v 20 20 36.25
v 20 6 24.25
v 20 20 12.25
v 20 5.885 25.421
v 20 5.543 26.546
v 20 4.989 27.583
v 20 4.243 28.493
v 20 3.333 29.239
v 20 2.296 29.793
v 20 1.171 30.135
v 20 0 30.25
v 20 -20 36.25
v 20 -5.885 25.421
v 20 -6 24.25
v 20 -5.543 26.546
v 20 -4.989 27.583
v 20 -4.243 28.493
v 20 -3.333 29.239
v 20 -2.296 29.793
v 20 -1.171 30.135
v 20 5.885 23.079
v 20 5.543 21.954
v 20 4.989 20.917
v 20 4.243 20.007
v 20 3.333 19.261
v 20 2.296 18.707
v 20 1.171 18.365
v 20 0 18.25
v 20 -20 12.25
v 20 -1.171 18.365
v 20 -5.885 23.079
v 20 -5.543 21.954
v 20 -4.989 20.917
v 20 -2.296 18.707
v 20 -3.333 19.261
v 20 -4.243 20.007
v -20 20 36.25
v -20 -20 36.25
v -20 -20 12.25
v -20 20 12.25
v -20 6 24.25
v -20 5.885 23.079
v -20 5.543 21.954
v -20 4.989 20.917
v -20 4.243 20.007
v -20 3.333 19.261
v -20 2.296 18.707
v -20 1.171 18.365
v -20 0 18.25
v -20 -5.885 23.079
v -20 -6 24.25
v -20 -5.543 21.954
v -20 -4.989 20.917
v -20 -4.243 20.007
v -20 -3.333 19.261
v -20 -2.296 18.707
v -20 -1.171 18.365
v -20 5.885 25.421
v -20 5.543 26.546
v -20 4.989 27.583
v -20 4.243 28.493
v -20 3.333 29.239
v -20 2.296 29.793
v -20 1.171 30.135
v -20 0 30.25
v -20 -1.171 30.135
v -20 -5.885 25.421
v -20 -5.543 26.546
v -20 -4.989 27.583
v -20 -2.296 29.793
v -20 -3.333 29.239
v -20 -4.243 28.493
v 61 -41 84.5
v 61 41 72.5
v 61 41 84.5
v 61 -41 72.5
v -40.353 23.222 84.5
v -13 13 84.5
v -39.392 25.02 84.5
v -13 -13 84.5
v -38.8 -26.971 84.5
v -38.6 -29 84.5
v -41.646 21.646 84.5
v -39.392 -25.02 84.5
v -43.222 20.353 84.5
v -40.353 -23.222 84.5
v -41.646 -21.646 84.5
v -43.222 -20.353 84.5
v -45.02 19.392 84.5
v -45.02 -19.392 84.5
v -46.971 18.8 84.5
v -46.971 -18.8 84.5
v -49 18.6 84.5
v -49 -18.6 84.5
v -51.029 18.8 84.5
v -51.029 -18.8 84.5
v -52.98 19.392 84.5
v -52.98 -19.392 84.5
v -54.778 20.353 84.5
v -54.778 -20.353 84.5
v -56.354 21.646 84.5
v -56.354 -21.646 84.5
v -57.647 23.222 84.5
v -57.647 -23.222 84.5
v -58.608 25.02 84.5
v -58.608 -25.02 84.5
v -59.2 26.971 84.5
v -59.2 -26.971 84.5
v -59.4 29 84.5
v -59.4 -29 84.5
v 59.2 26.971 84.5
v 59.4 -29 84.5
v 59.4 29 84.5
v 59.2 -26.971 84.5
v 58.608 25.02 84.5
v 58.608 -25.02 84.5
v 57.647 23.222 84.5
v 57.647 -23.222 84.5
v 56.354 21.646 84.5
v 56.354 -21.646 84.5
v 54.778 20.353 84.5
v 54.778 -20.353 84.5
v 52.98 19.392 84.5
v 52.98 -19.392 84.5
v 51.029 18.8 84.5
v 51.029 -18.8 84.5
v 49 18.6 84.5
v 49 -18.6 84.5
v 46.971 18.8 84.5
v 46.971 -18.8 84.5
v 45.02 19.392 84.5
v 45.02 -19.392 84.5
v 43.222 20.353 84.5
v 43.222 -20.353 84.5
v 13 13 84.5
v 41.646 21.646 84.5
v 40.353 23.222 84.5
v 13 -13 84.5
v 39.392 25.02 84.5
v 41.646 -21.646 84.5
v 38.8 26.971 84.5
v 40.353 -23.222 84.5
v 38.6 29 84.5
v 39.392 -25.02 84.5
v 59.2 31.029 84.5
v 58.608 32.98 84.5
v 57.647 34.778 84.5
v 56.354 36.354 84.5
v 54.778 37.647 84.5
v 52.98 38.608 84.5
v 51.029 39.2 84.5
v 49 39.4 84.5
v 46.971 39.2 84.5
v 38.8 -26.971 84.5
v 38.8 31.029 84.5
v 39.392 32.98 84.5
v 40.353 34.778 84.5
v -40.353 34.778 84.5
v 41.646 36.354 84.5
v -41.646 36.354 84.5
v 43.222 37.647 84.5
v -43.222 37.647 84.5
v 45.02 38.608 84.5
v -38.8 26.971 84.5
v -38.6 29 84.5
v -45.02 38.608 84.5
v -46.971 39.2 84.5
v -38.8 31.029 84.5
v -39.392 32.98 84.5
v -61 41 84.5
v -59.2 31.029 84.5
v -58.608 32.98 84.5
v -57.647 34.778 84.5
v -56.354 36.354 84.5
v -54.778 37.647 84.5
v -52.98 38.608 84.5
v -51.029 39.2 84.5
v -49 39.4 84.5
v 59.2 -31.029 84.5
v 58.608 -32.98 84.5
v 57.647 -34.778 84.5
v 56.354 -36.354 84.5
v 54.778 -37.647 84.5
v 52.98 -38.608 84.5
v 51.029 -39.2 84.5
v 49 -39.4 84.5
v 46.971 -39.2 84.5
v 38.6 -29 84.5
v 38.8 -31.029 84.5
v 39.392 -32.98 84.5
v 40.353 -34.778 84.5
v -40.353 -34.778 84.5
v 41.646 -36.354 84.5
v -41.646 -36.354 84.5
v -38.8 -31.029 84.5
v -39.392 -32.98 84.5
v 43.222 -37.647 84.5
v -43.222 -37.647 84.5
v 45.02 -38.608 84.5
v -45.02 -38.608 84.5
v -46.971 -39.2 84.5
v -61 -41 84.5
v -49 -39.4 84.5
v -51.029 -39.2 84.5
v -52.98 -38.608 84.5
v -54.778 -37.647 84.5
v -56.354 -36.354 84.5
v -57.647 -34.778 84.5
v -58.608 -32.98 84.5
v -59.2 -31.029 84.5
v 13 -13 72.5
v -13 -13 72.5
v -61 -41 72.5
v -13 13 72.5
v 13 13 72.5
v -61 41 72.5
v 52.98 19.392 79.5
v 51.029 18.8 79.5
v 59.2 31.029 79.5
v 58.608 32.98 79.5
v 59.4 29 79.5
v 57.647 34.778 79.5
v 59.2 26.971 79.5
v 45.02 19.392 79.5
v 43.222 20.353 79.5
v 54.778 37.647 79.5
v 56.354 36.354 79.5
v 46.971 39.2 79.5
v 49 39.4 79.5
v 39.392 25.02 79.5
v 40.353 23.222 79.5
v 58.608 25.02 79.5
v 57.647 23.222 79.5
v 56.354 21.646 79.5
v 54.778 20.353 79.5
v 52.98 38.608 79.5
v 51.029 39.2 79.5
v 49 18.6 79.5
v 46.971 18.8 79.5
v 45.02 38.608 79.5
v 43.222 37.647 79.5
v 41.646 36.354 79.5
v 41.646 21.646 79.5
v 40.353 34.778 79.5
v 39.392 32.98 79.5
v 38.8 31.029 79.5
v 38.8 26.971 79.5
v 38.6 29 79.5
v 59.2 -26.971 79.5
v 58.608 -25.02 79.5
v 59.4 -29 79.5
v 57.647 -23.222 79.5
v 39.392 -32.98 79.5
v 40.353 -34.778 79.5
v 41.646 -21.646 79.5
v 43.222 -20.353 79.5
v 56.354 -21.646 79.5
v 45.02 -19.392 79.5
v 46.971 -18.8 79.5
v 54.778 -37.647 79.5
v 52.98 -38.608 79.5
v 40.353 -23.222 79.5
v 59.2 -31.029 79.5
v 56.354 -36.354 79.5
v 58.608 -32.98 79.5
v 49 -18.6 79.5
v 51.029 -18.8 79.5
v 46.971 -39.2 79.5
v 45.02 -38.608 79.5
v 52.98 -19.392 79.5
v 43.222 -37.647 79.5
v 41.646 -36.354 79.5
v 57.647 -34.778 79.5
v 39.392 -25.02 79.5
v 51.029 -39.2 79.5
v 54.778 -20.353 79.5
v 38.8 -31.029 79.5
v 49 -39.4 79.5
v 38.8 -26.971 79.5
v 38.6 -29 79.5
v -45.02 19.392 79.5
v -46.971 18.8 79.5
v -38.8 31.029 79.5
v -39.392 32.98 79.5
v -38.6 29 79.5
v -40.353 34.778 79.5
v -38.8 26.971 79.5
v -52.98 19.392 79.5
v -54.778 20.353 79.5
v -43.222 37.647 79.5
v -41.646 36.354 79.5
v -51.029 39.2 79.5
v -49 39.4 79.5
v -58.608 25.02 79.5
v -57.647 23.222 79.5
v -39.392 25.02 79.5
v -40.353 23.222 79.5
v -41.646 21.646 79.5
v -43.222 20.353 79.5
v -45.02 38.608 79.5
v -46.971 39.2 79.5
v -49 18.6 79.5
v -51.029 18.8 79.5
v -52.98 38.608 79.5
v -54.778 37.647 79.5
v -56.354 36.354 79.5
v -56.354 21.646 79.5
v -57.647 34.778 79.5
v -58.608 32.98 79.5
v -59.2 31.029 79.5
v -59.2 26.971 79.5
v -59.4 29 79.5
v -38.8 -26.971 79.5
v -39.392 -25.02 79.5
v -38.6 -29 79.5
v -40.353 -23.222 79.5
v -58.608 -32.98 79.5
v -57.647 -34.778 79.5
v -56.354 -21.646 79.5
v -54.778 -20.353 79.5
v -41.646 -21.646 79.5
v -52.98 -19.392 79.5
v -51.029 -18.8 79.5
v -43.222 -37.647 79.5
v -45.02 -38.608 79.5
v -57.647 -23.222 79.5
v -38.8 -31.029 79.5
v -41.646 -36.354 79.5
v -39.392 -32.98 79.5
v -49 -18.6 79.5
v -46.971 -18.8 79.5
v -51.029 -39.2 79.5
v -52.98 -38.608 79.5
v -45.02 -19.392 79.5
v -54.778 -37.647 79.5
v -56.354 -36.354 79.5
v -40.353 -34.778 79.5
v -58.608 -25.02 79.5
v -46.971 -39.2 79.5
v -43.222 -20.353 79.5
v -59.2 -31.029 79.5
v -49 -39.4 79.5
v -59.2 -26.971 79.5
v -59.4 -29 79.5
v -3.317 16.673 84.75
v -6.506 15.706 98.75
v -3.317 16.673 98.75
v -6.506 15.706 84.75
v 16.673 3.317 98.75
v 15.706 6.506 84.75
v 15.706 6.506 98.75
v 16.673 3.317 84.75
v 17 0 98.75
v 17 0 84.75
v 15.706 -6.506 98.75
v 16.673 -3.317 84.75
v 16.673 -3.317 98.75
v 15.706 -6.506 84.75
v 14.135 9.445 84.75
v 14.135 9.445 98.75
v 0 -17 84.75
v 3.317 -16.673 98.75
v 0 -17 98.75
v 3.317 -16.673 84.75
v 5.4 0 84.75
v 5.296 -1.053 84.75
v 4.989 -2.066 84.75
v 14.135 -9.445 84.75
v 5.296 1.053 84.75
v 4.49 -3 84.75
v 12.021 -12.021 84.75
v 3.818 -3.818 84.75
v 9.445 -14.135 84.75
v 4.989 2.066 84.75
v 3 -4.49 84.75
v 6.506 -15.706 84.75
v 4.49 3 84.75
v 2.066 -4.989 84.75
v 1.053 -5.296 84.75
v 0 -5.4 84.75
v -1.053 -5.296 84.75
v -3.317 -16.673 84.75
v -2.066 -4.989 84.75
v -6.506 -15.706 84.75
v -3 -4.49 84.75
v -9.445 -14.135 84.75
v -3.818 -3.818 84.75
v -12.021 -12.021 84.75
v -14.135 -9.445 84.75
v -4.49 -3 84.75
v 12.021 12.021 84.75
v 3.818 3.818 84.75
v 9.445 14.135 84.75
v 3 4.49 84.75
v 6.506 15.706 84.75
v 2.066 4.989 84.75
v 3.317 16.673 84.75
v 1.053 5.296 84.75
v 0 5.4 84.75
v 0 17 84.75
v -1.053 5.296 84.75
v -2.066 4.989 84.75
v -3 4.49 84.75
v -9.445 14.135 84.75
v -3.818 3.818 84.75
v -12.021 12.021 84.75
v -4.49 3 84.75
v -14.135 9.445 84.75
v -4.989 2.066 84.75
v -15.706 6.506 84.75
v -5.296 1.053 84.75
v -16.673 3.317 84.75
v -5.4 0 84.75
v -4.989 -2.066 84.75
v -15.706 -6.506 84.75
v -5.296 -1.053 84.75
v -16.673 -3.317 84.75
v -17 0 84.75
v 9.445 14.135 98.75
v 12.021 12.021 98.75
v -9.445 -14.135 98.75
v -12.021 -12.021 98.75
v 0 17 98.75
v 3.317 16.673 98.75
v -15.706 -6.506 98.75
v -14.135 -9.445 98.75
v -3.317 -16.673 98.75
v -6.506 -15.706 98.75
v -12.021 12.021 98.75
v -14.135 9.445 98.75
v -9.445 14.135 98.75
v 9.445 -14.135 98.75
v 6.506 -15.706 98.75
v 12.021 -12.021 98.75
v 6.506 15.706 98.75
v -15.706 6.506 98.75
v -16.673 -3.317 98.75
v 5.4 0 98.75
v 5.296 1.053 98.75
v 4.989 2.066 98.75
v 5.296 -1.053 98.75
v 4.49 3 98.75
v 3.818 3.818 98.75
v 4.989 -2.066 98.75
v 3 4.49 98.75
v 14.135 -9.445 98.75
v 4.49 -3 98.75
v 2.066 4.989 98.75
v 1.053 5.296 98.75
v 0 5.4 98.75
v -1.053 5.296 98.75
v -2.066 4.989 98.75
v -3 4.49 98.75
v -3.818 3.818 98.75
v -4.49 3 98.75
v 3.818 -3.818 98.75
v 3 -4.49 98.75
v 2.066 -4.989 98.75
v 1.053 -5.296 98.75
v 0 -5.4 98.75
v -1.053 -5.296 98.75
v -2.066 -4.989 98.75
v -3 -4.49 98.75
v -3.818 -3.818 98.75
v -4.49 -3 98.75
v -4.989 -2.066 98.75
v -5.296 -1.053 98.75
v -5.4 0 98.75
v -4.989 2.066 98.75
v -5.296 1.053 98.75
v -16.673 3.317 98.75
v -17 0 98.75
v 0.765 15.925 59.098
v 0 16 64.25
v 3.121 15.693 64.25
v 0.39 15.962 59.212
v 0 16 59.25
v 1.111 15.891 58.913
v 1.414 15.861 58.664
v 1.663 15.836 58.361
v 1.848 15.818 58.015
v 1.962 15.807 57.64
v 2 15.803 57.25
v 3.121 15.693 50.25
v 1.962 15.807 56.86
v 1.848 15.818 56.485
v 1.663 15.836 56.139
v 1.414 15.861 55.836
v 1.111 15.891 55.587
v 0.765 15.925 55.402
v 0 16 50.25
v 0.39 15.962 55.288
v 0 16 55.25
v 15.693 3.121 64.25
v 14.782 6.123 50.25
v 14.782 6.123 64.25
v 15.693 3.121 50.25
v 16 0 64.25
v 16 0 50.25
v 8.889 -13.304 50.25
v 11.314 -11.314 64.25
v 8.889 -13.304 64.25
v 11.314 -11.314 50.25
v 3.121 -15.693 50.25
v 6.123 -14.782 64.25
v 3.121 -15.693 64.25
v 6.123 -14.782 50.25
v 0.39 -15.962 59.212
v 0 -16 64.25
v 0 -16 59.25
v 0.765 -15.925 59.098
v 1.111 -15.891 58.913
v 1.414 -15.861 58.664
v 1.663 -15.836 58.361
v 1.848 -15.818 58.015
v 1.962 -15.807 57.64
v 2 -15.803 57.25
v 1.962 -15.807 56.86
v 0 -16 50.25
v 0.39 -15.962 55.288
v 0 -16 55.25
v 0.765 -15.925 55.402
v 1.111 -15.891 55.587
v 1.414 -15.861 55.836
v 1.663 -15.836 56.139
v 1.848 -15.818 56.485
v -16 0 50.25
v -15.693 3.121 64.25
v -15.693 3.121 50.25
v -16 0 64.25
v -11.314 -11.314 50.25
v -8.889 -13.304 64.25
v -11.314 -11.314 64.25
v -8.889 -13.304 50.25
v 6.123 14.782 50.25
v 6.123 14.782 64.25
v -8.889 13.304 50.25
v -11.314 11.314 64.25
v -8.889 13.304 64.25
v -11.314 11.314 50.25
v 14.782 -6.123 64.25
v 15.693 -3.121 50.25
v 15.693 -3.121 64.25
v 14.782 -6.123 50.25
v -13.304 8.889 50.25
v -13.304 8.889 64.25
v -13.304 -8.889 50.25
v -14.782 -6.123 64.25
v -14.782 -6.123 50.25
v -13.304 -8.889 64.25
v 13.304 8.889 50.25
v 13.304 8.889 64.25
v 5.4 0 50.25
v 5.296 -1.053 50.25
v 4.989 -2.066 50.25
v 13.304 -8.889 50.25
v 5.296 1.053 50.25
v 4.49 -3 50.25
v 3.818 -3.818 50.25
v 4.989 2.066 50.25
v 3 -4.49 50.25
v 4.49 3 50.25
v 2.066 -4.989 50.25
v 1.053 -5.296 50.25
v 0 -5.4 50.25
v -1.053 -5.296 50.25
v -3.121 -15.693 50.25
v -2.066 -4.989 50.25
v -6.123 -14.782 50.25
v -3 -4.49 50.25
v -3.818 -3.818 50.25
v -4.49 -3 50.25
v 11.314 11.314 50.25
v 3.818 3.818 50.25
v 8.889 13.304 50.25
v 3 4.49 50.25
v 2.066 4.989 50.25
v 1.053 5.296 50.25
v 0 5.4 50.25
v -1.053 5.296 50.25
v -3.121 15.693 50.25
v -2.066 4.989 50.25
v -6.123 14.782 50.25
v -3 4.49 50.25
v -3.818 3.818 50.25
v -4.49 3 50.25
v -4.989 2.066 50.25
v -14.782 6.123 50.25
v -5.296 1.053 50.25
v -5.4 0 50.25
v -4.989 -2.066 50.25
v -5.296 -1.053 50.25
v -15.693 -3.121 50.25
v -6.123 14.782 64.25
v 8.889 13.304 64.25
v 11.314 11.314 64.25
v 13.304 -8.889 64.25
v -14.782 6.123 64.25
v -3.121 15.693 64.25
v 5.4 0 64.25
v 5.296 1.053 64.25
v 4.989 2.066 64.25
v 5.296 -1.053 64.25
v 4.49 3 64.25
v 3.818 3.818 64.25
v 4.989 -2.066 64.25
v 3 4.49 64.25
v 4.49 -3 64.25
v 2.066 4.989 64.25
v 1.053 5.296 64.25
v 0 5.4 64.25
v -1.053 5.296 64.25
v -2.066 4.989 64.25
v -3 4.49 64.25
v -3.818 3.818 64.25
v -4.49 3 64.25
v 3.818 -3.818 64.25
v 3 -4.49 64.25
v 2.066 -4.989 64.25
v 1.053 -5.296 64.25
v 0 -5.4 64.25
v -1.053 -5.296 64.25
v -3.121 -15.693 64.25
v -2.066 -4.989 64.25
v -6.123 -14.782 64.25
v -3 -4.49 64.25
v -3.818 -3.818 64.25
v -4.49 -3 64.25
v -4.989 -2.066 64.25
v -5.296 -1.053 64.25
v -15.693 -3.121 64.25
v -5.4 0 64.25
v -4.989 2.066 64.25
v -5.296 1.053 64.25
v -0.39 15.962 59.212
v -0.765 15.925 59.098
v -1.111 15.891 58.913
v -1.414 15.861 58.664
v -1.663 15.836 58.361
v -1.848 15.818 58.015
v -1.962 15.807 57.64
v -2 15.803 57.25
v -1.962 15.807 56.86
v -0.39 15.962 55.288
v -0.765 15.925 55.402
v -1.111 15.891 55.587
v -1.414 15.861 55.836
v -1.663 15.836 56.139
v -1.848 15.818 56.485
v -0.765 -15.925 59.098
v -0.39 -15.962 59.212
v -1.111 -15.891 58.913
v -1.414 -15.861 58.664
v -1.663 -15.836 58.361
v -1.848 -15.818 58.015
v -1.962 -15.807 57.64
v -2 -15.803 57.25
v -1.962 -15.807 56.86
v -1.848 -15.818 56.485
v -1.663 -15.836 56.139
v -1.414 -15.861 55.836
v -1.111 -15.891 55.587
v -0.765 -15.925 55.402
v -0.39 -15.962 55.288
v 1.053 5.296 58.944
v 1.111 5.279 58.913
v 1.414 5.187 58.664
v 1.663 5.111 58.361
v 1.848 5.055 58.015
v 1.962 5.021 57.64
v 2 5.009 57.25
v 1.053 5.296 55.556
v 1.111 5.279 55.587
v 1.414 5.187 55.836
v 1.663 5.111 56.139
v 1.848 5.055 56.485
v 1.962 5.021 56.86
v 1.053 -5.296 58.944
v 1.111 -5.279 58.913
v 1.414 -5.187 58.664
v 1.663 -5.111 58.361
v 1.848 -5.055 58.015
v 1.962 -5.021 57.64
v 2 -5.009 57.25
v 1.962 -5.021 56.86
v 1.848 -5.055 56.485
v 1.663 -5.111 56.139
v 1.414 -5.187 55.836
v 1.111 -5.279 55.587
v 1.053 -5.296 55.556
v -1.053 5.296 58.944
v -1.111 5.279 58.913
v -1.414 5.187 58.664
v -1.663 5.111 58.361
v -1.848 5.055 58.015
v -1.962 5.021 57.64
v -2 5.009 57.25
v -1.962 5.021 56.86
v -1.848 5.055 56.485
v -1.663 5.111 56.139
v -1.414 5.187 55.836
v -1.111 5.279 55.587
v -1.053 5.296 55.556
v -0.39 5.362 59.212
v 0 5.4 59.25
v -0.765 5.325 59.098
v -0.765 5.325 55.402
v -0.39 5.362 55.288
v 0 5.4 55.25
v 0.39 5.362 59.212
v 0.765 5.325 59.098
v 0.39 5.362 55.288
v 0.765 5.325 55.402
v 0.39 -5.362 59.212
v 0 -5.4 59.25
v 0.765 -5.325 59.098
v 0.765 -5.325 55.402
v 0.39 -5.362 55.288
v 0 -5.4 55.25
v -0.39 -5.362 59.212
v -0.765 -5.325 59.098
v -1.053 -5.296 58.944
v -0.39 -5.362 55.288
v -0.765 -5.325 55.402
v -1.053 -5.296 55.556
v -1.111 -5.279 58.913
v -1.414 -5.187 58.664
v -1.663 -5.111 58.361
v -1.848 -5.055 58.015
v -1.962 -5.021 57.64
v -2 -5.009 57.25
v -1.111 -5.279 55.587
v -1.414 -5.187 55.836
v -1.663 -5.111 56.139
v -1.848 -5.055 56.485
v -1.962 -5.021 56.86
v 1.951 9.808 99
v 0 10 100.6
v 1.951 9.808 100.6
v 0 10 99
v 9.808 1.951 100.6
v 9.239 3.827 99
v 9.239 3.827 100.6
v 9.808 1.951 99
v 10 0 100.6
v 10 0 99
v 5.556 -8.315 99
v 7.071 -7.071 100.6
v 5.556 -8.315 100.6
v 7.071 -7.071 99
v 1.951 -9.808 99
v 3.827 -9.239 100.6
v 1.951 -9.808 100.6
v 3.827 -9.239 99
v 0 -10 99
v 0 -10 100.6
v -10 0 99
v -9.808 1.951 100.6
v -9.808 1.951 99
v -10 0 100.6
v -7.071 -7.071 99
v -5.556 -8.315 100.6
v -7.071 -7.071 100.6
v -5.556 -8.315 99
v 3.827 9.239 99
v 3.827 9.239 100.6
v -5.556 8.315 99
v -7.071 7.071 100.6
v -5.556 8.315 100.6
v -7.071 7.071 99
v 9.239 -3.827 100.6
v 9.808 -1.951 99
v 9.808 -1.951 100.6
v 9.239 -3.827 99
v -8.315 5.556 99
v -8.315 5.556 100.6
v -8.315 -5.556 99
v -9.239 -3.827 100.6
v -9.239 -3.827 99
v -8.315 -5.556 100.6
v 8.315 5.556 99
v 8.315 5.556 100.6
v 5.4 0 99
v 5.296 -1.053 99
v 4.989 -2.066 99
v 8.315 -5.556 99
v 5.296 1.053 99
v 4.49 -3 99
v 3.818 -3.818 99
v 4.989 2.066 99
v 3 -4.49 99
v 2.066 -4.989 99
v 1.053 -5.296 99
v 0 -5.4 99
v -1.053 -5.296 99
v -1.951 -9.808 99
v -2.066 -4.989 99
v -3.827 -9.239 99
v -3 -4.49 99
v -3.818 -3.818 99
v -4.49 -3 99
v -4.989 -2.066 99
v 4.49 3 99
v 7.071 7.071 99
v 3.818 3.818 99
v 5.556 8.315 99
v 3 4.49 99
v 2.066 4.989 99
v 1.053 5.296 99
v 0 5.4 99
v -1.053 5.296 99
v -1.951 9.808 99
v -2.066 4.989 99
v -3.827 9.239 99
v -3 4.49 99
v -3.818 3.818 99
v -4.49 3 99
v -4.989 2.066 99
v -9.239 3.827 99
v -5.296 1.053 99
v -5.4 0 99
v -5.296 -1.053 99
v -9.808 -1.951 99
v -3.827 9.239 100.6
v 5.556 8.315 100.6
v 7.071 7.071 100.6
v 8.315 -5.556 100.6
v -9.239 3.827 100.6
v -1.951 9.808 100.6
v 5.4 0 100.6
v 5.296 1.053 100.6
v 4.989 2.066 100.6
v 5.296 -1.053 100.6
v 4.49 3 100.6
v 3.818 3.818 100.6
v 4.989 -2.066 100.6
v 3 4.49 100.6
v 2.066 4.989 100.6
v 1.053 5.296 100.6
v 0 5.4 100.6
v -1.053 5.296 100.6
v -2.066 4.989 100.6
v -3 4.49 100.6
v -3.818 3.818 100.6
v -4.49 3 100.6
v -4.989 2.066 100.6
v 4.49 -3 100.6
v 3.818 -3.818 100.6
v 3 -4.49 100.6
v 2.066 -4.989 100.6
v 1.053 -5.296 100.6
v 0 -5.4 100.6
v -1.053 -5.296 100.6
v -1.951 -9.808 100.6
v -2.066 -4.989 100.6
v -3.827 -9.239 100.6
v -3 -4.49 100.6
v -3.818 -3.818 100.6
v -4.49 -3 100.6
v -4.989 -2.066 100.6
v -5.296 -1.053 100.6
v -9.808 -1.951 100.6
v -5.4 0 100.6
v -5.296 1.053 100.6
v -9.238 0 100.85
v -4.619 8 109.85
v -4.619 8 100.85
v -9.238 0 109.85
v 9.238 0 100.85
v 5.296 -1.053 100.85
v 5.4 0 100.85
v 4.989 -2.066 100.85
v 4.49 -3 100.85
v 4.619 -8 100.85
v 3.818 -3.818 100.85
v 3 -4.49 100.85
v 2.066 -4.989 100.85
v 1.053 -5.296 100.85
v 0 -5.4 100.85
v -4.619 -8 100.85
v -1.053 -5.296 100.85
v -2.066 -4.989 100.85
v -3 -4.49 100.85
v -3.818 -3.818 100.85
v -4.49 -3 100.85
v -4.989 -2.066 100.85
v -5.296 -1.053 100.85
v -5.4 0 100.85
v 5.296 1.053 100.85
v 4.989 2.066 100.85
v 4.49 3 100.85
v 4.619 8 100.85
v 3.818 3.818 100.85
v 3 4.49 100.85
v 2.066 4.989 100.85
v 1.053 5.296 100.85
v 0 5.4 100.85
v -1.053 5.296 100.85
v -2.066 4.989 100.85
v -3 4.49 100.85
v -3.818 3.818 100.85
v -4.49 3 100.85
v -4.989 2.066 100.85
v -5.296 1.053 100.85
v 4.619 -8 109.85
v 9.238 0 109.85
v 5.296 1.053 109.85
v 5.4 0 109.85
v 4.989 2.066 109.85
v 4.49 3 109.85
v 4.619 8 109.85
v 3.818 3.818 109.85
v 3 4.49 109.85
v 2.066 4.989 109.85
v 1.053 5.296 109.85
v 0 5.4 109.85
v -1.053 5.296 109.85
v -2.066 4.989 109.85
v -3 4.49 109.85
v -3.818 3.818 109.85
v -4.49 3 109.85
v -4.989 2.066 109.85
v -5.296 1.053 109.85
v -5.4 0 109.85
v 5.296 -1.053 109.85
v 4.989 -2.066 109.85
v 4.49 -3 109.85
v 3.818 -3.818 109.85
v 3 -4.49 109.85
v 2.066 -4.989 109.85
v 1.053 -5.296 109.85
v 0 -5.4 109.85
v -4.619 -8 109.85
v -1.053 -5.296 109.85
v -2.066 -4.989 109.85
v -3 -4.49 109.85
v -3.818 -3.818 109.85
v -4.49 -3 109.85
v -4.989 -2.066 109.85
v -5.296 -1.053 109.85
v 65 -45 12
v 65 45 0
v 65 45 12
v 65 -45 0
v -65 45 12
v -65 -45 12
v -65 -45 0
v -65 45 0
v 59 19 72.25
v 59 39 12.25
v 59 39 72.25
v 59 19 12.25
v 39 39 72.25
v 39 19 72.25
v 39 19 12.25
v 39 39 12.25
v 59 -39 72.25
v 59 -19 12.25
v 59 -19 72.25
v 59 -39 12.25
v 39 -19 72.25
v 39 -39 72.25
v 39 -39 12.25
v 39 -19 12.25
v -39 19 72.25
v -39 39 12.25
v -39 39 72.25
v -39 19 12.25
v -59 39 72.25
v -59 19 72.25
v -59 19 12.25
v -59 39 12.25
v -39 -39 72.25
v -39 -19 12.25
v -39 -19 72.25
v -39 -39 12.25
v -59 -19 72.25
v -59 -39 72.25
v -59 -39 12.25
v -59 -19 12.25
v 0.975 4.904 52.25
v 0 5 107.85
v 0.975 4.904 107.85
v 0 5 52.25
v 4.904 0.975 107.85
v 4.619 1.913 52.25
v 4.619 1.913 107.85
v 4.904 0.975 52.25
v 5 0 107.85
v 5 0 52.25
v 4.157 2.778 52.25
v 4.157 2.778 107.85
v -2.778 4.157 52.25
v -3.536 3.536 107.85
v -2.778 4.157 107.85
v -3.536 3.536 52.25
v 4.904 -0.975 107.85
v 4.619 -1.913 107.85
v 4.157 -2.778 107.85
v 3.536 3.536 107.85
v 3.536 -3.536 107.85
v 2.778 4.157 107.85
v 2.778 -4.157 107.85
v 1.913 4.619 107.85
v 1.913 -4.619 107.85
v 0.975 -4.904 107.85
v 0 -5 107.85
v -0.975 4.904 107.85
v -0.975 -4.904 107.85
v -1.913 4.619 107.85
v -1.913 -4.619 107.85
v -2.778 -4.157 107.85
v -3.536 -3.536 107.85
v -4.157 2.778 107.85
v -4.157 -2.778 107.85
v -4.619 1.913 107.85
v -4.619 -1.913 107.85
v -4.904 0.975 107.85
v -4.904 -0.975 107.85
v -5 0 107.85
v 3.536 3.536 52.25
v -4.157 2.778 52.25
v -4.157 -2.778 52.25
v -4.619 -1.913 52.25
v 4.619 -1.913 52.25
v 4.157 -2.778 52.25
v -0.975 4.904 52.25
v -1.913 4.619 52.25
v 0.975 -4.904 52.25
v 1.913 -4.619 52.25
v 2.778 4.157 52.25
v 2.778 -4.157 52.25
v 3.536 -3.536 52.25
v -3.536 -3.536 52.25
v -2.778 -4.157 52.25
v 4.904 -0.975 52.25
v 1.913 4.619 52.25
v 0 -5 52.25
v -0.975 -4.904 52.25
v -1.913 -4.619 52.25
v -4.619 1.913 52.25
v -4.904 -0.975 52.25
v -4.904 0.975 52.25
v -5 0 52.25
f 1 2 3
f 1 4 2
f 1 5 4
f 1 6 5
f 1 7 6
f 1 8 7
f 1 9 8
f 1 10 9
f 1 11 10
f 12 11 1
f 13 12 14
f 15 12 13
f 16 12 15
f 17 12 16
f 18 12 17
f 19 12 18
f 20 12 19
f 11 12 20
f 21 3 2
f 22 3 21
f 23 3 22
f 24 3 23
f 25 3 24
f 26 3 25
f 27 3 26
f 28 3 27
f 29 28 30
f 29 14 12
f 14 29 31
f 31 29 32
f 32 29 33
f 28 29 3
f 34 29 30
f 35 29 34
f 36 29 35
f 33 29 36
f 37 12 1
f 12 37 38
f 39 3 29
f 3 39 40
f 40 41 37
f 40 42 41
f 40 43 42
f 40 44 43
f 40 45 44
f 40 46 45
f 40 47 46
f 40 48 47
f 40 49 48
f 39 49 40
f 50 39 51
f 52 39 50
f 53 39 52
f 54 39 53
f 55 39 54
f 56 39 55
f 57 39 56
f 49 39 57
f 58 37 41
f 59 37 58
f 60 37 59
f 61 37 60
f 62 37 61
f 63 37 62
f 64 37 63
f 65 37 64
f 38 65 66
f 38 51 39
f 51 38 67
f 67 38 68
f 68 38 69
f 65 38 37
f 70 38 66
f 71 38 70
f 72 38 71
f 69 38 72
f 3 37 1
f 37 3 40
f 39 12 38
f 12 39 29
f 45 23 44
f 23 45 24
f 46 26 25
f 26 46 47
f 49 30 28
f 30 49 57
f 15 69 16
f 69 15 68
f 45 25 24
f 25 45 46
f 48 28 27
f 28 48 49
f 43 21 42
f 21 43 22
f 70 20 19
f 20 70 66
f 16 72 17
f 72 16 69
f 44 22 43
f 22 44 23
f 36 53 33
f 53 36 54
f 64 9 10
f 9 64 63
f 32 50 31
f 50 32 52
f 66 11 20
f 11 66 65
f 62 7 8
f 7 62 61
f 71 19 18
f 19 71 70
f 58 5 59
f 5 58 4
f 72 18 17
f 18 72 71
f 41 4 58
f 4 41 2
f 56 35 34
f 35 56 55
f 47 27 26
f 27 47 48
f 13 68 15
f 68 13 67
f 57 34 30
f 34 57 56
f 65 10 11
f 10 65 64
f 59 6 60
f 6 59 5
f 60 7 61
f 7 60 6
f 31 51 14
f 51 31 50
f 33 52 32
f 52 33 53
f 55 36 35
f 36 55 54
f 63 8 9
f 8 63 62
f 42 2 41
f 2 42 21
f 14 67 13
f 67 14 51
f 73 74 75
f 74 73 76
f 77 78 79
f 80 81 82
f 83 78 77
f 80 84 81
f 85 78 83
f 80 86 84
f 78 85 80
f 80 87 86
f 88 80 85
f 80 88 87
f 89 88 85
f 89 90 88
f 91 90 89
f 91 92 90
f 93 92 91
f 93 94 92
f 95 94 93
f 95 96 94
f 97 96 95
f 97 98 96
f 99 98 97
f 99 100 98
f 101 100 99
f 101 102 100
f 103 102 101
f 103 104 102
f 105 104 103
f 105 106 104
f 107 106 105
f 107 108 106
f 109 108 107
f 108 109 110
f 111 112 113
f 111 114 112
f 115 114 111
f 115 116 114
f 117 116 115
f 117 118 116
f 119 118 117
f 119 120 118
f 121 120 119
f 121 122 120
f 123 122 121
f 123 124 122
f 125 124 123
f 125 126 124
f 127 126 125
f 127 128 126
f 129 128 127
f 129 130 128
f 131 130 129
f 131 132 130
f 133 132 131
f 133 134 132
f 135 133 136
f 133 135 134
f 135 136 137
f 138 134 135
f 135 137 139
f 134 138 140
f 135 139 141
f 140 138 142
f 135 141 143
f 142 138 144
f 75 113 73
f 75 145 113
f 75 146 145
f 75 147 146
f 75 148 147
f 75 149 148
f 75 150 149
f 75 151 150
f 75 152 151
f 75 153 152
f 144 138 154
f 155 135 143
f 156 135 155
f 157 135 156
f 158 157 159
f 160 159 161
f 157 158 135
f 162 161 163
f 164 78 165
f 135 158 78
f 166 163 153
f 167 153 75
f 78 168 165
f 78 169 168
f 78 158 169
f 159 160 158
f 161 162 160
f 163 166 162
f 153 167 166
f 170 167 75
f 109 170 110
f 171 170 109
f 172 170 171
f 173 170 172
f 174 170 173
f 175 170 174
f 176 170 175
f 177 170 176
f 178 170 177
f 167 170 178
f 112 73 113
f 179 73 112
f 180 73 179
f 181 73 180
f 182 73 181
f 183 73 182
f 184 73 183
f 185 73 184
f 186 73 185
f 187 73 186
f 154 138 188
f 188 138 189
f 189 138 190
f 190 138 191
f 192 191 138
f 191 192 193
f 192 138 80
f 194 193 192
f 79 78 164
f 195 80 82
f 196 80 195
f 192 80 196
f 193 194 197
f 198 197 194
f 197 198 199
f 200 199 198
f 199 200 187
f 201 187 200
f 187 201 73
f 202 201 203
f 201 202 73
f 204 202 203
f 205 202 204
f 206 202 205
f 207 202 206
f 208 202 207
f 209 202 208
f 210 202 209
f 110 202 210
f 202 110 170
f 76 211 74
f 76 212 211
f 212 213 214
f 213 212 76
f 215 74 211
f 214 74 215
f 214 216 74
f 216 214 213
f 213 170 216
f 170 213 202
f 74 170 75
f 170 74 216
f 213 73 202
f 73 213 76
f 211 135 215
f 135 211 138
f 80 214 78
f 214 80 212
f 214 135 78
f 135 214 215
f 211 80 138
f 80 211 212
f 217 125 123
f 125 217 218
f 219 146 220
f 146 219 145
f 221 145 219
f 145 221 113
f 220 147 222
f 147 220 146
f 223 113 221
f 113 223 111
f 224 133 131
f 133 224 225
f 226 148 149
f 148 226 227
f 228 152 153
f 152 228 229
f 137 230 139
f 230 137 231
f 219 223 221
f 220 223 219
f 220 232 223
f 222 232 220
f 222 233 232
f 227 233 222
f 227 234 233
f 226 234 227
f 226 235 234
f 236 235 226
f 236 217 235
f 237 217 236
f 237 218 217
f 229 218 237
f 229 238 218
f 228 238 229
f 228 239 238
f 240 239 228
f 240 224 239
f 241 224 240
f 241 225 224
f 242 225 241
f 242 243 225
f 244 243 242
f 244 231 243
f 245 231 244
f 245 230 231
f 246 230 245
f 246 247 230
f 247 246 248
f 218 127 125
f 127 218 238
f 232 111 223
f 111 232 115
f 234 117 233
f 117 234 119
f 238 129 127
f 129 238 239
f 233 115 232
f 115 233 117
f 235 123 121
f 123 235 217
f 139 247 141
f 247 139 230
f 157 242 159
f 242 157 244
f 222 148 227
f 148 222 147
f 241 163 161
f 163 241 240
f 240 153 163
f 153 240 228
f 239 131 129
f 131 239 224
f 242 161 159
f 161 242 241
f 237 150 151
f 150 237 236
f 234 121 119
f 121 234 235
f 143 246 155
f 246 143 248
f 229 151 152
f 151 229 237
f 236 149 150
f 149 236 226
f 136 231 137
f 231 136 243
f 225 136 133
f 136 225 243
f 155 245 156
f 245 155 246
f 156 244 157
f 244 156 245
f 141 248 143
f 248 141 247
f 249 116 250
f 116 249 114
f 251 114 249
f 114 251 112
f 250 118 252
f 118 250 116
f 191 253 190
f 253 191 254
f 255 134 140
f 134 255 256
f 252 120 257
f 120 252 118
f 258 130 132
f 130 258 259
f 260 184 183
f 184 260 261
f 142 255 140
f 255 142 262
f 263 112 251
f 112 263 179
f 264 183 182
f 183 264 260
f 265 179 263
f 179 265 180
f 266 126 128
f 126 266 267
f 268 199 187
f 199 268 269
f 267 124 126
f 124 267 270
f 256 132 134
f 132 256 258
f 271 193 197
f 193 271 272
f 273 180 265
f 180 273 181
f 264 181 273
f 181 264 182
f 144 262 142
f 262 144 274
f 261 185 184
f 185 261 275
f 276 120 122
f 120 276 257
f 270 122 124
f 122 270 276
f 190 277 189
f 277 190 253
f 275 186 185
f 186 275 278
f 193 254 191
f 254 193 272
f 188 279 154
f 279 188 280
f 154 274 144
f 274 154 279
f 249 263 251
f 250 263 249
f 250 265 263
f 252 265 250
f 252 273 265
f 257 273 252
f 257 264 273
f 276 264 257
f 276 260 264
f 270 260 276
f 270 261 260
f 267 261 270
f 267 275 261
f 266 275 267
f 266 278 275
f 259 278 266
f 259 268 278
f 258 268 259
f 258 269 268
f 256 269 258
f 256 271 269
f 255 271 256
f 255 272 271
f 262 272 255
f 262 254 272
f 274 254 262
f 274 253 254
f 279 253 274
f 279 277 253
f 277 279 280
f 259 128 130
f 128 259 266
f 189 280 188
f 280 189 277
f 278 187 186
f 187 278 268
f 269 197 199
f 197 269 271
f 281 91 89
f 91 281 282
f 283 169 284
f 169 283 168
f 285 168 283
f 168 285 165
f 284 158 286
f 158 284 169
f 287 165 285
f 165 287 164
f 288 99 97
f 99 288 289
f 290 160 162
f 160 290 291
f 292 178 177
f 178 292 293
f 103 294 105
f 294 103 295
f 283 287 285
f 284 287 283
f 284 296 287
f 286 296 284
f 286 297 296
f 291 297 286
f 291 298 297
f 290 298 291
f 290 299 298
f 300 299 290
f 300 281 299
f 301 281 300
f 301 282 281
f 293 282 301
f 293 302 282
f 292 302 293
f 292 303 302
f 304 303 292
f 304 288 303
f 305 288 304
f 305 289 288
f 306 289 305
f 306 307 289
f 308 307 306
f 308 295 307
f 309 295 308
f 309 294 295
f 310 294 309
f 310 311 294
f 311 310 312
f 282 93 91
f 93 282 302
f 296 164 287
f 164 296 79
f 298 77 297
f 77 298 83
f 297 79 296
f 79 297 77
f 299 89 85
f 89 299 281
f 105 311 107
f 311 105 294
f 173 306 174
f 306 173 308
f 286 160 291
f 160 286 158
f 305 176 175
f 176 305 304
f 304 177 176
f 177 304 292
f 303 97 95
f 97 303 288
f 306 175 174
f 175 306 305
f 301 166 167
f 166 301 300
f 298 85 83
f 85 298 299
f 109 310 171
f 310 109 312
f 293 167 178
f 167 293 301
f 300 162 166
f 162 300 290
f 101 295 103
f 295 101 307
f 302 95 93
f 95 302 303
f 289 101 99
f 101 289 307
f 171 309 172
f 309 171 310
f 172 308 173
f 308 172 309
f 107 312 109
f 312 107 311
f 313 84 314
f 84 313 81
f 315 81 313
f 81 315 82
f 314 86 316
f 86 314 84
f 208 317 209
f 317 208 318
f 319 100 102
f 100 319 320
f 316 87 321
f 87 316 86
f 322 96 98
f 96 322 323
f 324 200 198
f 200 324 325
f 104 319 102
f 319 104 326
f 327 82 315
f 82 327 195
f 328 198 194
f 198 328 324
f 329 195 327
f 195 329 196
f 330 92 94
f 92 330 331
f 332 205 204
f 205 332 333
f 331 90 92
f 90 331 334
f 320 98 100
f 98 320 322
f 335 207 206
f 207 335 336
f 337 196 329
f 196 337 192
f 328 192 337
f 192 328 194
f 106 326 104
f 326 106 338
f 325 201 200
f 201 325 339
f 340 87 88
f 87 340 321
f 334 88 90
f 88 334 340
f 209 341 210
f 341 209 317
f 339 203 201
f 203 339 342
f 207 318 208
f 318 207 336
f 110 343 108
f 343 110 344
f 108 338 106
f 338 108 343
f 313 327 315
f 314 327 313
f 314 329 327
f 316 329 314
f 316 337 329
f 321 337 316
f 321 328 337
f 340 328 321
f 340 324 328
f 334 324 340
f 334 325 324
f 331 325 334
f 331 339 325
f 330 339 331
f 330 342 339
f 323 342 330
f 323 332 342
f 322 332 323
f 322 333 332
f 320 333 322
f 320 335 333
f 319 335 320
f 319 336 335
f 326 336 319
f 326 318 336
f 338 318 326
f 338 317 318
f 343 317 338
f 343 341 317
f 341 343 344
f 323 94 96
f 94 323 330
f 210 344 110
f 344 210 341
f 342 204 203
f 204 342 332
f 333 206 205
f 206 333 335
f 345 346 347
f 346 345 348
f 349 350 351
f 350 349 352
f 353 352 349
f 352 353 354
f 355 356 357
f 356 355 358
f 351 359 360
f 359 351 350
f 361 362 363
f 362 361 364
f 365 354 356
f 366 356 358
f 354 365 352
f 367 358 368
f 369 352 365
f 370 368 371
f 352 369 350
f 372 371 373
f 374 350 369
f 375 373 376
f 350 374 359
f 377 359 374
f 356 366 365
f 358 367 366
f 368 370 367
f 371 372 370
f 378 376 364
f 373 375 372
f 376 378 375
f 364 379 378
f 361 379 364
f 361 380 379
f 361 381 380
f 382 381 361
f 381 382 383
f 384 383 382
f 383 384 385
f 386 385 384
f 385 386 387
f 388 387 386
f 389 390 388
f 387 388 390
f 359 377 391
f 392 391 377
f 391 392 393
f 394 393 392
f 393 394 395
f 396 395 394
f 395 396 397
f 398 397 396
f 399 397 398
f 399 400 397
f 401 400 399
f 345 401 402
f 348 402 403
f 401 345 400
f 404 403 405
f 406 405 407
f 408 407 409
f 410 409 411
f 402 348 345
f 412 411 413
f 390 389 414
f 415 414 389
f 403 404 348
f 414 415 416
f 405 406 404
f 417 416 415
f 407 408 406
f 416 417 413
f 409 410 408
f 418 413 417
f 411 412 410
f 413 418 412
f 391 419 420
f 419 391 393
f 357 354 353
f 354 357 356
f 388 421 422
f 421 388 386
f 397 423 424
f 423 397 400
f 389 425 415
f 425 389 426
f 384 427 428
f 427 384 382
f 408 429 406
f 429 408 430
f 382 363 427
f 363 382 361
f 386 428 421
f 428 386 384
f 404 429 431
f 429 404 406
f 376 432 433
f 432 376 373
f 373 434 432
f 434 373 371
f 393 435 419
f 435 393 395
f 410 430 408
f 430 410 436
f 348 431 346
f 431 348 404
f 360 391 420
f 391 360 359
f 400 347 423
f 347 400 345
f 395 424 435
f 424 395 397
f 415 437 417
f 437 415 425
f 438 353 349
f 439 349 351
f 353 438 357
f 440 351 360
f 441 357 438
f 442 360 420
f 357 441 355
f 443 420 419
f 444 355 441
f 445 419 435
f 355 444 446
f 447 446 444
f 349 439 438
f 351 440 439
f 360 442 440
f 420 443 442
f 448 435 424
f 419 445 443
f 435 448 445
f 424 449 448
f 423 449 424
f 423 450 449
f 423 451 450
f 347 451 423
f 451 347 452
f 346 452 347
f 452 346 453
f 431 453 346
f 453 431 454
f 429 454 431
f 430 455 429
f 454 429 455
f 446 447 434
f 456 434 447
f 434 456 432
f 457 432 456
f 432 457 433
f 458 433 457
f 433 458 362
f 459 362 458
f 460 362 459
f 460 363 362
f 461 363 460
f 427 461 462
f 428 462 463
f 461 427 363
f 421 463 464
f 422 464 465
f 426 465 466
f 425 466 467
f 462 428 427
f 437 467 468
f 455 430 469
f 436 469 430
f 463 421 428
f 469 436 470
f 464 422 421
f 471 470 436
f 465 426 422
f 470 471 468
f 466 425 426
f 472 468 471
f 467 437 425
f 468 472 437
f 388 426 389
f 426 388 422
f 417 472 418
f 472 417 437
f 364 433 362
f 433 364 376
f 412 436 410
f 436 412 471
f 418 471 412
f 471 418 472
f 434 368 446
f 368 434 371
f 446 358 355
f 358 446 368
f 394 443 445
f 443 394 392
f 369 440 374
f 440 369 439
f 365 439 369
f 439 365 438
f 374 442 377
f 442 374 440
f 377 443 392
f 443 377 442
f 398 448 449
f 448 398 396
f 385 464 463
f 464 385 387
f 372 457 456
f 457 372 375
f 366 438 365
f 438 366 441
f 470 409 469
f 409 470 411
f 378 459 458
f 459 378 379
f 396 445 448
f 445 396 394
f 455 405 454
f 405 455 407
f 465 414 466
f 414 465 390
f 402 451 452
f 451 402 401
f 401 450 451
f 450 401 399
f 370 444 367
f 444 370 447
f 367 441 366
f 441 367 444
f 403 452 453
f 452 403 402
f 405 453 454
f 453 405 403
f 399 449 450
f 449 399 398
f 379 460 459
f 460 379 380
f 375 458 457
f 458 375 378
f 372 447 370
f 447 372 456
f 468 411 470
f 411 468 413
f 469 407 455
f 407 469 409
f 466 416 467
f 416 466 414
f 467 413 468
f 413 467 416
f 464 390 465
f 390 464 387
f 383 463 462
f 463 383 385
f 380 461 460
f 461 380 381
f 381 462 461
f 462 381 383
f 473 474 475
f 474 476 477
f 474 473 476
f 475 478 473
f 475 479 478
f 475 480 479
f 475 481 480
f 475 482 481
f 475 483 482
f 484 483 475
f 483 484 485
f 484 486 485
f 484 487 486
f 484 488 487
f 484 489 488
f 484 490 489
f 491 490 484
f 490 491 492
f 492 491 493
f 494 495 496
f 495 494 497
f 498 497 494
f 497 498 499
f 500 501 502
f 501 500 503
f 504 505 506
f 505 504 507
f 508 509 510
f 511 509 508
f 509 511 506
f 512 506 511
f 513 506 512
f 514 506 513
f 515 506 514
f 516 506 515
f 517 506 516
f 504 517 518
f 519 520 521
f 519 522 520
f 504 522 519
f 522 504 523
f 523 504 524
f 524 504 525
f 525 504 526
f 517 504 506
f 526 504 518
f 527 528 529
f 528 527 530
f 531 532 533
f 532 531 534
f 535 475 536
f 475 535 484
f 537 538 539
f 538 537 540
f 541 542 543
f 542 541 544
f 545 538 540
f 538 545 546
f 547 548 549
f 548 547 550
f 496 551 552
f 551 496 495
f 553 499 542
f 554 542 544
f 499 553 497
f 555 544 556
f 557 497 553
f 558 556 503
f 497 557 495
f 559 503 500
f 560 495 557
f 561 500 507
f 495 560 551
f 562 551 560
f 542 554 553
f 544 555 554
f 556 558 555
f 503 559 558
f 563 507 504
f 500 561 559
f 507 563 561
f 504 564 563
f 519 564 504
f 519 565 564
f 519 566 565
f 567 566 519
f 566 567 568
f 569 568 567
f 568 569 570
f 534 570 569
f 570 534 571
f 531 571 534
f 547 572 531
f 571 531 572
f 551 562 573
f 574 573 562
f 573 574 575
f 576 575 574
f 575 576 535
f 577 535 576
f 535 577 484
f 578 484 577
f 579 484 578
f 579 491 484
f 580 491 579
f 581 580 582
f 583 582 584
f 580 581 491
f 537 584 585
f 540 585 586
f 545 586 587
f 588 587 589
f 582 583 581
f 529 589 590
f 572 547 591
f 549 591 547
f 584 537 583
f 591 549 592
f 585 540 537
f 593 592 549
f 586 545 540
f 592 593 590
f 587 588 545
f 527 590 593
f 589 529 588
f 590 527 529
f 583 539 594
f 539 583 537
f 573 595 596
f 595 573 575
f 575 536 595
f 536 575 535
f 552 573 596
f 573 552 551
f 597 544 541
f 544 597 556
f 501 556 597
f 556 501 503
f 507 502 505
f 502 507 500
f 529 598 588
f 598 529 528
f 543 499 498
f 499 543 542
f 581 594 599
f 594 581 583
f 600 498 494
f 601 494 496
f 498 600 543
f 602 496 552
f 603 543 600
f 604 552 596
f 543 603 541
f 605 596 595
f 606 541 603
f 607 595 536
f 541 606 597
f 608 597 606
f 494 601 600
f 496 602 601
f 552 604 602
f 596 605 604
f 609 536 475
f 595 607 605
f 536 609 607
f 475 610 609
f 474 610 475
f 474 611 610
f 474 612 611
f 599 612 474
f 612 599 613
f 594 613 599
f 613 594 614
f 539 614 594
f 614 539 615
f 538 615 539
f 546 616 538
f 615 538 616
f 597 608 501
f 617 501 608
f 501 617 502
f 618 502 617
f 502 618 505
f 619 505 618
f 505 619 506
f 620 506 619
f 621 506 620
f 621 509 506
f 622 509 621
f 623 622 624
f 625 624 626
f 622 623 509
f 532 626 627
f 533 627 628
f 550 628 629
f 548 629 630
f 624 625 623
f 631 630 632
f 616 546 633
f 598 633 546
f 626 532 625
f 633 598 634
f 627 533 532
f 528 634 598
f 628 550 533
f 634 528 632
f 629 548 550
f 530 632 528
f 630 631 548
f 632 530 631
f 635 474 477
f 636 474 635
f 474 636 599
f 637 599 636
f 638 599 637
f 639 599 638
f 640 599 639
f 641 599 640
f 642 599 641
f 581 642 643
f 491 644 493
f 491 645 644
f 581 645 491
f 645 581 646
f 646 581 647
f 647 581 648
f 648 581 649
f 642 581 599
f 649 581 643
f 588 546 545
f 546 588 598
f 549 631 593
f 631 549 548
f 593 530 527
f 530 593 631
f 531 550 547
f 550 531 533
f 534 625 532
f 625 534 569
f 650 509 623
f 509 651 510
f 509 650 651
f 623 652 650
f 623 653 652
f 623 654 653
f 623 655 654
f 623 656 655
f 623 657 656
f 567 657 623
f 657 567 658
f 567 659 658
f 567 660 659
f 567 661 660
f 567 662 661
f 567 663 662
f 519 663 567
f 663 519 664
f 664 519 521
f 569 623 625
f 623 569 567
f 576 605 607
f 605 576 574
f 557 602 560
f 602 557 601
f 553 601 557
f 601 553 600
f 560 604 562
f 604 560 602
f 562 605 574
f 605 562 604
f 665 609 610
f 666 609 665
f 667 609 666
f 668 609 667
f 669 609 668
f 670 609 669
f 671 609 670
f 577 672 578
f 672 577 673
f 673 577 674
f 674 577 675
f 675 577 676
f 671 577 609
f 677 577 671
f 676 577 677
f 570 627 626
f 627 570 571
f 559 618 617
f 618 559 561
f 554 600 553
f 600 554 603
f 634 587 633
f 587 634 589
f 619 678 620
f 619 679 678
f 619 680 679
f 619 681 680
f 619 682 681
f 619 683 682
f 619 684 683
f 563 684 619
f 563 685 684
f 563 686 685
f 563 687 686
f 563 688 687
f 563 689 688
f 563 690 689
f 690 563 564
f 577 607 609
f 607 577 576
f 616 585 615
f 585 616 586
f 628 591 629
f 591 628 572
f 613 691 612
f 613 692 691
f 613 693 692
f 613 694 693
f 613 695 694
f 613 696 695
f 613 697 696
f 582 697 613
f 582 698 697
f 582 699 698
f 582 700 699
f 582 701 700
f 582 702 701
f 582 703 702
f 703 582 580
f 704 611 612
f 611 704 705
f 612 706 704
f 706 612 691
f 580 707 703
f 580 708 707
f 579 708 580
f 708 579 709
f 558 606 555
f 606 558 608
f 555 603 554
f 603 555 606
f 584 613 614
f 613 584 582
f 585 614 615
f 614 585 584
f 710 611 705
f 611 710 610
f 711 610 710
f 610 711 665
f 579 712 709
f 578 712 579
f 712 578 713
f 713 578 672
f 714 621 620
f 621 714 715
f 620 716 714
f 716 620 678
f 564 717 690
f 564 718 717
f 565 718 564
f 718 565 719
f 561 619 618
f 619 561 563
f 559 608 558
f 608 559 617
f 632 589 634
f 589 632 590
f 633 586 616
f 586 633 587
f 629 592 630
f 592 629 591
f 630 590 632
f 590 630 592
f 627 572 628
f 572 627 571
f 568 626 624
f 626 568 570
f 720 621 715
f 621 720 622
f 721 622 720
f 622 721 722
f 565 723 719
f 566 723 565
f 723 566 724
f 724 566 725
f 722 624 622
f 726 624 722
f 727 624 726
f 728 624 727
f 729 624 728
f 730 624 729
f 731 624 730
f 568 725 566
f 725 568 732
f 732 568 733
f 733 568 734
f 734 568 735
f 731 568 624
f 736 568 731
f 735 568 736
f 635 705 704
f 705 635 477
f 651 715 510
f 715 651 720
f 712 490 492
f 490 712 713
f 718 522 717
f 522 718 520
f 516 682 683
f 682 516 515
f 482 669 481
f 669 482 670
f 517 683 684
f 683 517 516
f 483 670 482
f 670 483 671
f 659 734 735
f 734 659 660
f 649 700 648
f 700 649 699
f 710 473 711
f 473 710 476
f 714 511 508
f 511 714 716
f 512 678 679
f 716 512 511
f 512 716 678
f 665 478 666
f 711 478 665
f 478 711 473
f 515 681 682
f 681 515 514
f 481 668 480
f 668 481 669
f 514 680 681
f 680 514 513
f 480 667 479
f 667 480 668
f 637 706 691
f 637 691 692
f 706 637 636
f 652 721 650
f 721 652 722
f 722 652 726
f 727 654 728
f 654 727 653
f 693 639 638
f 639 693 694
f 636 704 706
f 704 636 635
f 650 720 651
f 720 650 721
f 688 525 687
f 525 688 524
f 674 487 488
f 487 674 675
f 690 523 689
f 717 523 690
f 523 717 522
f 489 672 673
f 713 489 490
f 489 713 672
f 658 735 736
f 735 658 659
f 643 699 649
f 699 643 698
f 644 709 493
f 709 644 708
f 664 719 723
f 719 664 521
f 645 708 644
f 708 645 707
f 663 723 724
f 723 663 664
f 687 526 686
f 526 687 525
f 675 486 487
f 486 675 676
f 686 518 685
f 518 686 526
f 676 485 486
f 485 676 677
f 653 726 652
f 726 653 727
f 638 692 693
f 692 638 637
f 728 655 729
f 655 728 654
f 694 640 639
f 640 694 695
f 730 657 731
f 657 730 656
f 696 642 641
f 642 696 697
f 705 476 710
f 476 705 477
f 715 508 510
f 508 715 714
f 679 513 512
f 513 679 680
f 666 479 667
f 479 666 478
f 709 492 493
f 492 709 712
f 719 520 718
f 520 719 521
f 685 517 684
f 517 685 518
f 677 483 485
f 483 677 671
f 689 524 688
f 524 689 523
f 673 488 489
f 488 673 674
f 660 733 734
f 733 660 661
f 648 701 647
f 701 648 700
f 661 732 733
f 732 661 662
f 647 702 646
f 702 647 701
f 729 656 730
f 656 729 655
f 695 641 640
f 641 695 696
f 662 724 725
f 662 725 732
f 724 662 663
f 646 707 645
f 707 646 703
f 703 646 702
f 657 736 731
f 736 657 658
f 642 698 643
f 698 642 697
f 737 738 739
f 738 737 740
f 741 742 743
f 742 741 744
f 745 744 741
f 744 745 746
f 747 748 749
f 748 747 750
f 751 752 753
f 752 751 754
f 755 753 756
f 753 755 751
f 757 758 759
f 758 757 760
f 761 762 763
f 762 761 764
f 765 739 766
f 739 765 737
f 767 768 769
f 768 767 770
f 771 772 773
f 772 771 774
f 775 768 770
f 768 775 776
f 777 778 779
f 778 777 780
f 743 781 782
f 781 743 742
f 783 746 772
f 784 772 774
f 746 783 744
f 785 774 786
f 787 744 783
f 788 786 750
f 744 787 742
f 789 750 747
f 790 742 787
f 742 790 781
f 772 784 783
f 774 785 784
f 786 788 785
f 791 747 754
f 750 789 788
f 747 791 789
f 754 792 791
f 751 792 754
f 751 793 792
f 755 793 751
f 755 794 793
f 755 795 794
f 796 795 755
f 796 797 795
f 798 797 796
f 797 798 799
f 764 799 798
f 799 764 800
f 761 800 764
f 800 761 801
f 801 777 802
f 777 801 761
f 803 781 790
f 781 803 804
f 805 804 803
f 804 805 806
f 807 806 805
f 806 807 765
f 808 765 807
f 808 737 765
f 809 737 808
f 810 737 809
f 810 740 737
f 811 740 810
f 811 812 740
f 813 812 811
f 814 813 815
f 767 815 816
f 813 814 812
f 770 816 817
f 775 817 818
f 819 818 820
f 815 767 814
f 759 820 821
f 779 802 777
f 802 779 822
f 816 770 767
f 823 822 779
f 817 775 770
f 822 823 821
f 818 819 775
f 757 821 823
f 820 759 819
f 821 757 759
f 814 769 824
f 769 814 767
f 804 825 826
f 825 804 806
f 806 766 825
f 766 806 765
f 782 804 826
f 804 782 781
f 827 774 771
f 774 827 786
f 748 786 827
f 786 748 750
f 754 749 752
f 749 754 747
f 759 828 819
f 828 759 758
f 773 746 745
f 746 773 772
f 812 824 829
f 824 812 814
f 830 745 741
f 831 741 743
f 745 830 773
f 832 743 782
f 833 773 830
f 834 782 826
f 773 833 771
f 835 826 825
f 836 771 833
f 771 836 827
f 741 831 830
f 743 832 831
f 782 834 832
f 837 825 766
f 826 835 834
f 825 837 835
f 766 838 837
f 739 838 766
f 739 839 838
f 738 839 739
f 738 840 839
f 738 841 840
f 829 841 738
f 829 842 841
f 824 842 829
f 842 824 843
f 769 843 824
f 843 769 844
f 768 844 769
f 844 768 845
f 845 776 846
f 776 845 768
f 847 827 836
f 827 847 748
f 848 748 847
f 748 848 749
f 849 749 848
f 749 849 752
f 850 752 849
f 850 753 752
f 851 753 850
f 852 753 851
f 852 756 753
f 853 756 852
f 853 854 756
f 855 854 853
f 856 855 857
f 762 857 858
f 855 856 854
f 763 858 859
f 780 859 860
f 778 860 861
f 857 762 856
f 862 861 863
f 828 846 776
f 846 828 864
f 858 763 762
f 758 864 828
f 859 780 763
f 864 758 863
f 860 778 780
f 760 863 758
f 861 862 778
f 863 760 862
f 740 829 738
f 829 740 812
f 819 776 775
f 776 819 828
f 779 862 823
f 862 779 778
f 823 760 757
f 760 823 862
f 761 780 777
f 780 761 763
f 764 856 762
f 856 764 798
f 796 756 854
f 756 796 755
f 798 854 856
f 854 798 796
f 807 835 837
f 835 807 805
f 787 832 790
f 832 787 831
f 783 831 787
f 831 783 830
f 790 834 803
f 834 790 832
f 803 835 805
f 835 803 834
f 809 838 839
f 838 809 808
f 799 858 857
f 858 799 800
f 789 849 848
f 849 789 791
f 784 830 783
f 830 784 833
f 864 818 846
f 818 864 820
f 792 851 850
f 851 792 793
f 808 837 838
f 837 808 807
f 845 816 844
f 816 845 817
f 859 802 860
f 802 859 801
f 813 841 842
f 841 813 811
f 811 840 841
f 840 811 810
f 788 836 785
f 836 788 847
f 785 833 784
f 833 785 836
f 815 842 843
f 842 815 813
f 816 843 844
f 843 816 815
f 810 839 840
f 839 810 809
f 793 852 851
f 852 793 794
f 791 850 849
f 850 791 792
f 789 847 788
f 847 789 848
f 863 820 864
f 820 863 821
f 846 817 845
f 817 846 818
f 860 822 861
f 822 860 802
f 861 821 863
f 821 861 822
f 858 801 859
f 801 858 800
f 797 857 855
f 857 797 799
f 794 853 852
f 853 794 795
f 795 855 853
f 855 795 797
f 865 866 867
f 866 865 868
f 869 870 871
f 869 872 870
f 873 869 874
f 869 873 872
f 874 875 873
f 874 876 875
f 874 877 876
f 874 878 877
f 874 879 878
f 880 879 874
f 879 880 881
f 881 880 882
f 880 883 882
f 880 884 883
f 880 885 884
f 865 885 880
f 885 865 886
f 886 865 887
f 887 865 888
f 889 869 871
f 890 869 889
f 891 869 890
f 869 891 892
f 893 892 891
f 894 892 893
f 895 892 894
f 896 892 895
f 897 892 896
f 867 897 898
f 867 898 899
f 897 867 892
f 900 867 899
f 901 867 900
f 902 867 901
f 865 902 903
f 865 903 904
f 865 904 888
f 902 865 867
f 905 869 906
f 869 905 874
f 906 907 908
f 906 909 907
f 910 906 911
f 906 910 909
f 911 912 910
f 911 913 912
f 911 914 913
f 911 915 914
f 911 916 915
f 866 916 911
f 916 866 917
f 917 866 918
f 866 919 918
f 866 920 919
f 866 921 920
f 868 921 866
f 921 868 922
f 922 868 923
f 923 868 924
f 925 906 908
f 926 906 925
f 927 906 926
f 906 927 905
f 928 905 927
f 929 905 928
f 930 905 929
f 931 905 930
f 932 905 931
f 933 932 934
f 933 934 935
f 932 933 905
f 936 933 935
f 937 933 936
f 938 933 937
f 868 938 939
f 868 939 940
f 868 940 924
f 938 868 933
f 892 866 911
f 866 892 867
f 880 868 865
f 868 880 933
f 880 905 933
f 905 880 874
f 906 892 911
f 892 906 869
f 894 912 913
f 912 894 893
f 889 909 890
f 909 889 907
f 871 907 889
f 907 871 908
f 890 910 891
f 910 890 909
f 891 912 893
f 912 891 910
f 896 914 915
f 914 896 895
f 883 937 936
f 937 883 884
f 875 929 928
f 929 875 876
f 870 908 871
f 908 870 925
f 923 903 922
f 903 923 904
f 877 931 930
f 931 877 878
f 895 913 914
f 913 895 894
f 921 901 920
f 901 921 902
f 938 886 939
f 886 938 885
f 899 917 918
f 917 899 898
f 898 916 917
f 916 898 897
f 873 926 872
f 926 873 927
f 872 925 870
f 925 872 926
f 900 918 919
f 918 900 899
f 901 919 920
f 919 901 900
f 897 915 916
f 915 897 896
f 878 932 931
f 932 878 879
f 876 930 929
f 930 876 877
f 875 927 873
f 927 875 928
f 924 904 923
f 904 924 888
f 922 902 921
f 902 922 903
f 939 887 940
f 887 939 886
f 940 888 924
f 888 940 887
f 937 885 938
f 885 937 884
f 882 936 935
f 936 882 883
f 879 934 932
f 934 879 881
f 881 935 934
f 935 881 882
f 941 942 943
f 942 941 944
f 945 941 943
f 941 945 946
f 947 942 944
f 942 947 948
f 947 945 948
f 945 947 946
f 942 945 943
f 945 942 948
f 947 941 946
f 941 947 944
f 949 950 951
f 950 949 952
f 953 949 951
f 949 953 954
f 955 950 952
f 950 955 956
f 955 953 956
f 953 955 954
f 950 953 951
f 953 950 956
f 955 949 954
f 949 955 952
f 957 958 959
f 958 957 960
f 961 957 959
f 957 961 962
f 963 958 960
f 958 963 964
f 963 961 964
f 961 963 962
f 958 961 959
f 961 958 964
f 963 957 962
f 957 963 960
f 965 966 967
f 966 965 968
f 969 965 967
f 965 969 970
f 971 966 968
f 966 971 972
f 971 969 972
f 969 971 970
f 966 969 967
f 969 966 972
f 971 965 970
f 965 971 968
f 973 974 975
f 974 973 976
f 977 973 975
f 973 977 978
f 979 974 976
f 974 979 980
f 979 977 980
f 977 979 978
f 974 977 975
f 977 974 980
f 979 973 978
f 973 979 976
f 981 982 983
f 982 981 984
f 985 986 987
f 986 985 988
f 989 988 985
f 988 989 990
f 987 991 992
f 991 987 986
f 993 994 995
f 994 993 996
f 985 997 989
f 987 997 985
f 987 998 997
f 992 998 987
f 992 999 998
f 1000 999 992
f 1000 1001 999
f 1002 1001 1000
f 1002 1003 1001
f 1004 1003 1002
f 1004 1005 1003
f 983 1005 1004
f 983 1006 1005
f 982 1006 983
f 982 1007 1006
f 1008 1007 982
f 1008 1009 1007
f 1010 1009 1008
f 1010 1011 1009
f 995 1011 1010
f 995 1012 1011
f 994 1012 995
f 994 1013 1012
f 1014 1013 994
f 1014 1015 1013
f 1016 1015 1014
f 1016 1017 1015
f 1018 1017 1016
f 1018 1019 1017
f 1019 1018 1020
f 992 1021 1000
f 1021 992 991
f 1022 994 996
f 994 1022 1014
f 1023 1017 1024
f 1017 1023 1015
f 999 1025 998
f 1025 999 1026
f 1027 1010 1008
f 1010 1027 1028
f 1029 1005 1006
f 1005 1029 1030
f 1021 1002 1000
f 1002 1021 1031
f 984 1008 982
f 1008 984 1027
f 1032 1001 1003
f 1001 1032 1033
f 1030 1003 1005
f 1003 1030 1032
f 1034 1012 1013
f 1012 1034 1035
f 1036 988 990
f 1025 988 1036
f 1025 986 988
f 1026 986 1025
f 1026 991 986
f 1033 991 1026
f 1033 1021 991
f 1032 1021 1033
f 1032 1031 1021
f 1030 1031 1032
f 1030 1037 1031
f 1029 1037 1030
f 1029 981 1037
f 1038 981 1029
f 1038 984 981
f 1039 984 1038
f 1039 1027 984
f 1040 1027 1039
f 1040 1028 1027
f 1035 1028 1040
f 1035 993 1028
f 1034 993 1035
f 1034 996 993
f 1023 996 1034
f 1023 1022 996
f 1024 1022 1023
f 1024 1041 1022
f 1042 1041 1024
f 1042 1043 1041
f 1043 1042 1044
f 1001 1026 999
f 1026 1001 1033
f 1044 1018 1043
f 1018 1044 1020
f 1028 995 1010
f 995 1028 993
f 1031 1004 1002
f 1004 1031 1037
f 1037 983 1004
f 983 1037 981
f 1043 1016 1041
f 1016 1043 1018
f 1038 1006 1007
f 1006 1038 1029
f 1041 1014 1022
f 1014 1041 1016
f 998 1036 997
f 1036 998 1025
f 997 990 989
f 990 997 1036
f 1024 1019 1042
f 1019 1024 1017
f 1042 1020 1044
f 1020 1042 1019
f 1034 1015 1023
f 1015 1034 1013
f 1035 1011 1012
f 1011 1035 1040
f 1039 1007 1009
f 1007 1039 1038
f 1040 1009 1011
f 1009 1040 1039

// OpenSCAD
$fn = 32;

// ------------------------------------------------------------------------
// Arbor press fixture: screw d10, posts 60 mm, gap 14 mm
// Every part is its own module, assembly() places every instance.
// ------------------------------------------------------------------------

// --- part 1 ---
module press_bed() {
  difference() {
    translate([-65, -45, 0]) cube([130, 90, 12]);
  }
}

// --- part 2 ---
module anvil_block() {
  difference() {
    translate([-20, -20, 0]) cube([40, 40, 24]);
    translate([0, 0, 12]) rotate([0, 90, 0]) cylinder(h = 42, d = 12, center = true);
  }
}

// --- part 3 ---
module press_post_a() {
  translate([-10, -10, 0]) cube([20, 20, 60]);
}

// --- part 4 ---
module press_post_b() {
  translate([-10, -10, 0]) cube([20, 20, 60]);
}

// --- part 5 ---
module press_post_c() {
  translate([-10, -10, 0]) cube([20, 20, 60]);
}

// --- part 6 ---
module press_post_d() {
  translate([-10, -10, 0]) cube([20, 20, 60]);
}

// --- part 7 ---
module press_frame() {
  difference() {
    translate([-61, -41, 0]) cube([122, 82, 12]);
    translate([-13, -13, -1]) cube([26, 26, 14]);
    translate([49, 29, 7]) cylinder(h = 6, d = 20.8);
    translate([49, -29, 7]) cylinder(h = 6, d = 20.8);
    translate([-49, 29, 7]) cylinder(h = 6, d = 20.8);
    translate([-49, -29, 7]) cylinder(h = 6, d = 20.8);
  }
}

// --- part 8 ---
module guide_ring() {
  difference() {
      translate([0, 0, 0]) cylinder(h = 14, d = 34);
      translate([0, 0, -1]) cylinder(h = 16, d = 10.8);
    }
}

// --- part 9 ---
module press_screw() {
  translate([0, 0, -27.8]) cylinder(h = 55.6, d = 10);
}

// --- part 10 ---
module press_head() {
  difference() {
    cylinder(h = 14, d = 32);
    translate([0, 0, -1]) cylinder(h = 16, d = 10.8);
    translate([0, 0, 7]) rotate([90, 0, 0]) cylinder(h = 34, d = 4, center = true);
  }
}

// --- part 11 ---
module nut_washer() {
  difference() {
      translate([0, 0, 0]) cylinder(h = 1.6, d = 20);
      translate([0, 0, -1]) cylinder(h = 3.6, d = 10.8);
    }
}

// --- part 12 ---
module press_nut() {
  difference() {
    linear_extrude(height = 9) polygon(points = [[9.238, 0], [4.619, 8], [-4.619, 8], [-9.238, 0], [-4.619, -8], [4.619, -8]]);
    translate([0, 0, -1]) cylinder(h = 11, d = 10.8);
  }
}

// --- assembly ---
module assembly() {
  color([0.80, 0.24, 0.20]) translate([0, 0, 0]) rotate([0, 0, 0]) press_bed();
  color([0.20, 0.45, 0.75]) translate([0, 0, 12.25]) rotate([0, 0, 0]) anvil_block();
  color([0.25, 0.62, 0.32]) translate([49, 29, 12.25]) rotate([0, 0, 0]) press_post_a();
  color([0.92, 0.70, 0.18]) translate([49, -29, 12.25]) rotate([0, 0, 0]) press_post_b();
  color([0.58, 0.35, 0.70]) translate([-49, 29, 12.25]) rotate([0, 0, 0]) press_post_c();
  color([0.16, 0.66, 0.66]) translate([-49, -29, 12.25]) rotate([0, 0, 0]) press_post_d();
  color([0.85, 0.48, 0.18]) translate([0, 0, 72.5]) rotate([0, 0, 0]) press_frame();
  color([0.55, 0.60, 0.65]) translate([0, 0, 84.75]) rotate([0, 0, 0]) guide_ring();
  color([0.75, 0.30, 0.55]) translate([0, 0, 80.05]) rotate([0, 0, 0]) press_screw();
  color([0.42, 0.52, 0.28]) translate([0, 0, 50.25]) rotate([0, 0, 0]) press_head();
  color([0.80, 0.24, 0.20]) translate([0, 0, 99]) rotate([0, 0, 0]) nut_washer();
  color([0.20, 0.45, 0.75]) translate([0, 0, 100.85]) rotate([0, 0, 0]) press_nut();
}

assembly();
